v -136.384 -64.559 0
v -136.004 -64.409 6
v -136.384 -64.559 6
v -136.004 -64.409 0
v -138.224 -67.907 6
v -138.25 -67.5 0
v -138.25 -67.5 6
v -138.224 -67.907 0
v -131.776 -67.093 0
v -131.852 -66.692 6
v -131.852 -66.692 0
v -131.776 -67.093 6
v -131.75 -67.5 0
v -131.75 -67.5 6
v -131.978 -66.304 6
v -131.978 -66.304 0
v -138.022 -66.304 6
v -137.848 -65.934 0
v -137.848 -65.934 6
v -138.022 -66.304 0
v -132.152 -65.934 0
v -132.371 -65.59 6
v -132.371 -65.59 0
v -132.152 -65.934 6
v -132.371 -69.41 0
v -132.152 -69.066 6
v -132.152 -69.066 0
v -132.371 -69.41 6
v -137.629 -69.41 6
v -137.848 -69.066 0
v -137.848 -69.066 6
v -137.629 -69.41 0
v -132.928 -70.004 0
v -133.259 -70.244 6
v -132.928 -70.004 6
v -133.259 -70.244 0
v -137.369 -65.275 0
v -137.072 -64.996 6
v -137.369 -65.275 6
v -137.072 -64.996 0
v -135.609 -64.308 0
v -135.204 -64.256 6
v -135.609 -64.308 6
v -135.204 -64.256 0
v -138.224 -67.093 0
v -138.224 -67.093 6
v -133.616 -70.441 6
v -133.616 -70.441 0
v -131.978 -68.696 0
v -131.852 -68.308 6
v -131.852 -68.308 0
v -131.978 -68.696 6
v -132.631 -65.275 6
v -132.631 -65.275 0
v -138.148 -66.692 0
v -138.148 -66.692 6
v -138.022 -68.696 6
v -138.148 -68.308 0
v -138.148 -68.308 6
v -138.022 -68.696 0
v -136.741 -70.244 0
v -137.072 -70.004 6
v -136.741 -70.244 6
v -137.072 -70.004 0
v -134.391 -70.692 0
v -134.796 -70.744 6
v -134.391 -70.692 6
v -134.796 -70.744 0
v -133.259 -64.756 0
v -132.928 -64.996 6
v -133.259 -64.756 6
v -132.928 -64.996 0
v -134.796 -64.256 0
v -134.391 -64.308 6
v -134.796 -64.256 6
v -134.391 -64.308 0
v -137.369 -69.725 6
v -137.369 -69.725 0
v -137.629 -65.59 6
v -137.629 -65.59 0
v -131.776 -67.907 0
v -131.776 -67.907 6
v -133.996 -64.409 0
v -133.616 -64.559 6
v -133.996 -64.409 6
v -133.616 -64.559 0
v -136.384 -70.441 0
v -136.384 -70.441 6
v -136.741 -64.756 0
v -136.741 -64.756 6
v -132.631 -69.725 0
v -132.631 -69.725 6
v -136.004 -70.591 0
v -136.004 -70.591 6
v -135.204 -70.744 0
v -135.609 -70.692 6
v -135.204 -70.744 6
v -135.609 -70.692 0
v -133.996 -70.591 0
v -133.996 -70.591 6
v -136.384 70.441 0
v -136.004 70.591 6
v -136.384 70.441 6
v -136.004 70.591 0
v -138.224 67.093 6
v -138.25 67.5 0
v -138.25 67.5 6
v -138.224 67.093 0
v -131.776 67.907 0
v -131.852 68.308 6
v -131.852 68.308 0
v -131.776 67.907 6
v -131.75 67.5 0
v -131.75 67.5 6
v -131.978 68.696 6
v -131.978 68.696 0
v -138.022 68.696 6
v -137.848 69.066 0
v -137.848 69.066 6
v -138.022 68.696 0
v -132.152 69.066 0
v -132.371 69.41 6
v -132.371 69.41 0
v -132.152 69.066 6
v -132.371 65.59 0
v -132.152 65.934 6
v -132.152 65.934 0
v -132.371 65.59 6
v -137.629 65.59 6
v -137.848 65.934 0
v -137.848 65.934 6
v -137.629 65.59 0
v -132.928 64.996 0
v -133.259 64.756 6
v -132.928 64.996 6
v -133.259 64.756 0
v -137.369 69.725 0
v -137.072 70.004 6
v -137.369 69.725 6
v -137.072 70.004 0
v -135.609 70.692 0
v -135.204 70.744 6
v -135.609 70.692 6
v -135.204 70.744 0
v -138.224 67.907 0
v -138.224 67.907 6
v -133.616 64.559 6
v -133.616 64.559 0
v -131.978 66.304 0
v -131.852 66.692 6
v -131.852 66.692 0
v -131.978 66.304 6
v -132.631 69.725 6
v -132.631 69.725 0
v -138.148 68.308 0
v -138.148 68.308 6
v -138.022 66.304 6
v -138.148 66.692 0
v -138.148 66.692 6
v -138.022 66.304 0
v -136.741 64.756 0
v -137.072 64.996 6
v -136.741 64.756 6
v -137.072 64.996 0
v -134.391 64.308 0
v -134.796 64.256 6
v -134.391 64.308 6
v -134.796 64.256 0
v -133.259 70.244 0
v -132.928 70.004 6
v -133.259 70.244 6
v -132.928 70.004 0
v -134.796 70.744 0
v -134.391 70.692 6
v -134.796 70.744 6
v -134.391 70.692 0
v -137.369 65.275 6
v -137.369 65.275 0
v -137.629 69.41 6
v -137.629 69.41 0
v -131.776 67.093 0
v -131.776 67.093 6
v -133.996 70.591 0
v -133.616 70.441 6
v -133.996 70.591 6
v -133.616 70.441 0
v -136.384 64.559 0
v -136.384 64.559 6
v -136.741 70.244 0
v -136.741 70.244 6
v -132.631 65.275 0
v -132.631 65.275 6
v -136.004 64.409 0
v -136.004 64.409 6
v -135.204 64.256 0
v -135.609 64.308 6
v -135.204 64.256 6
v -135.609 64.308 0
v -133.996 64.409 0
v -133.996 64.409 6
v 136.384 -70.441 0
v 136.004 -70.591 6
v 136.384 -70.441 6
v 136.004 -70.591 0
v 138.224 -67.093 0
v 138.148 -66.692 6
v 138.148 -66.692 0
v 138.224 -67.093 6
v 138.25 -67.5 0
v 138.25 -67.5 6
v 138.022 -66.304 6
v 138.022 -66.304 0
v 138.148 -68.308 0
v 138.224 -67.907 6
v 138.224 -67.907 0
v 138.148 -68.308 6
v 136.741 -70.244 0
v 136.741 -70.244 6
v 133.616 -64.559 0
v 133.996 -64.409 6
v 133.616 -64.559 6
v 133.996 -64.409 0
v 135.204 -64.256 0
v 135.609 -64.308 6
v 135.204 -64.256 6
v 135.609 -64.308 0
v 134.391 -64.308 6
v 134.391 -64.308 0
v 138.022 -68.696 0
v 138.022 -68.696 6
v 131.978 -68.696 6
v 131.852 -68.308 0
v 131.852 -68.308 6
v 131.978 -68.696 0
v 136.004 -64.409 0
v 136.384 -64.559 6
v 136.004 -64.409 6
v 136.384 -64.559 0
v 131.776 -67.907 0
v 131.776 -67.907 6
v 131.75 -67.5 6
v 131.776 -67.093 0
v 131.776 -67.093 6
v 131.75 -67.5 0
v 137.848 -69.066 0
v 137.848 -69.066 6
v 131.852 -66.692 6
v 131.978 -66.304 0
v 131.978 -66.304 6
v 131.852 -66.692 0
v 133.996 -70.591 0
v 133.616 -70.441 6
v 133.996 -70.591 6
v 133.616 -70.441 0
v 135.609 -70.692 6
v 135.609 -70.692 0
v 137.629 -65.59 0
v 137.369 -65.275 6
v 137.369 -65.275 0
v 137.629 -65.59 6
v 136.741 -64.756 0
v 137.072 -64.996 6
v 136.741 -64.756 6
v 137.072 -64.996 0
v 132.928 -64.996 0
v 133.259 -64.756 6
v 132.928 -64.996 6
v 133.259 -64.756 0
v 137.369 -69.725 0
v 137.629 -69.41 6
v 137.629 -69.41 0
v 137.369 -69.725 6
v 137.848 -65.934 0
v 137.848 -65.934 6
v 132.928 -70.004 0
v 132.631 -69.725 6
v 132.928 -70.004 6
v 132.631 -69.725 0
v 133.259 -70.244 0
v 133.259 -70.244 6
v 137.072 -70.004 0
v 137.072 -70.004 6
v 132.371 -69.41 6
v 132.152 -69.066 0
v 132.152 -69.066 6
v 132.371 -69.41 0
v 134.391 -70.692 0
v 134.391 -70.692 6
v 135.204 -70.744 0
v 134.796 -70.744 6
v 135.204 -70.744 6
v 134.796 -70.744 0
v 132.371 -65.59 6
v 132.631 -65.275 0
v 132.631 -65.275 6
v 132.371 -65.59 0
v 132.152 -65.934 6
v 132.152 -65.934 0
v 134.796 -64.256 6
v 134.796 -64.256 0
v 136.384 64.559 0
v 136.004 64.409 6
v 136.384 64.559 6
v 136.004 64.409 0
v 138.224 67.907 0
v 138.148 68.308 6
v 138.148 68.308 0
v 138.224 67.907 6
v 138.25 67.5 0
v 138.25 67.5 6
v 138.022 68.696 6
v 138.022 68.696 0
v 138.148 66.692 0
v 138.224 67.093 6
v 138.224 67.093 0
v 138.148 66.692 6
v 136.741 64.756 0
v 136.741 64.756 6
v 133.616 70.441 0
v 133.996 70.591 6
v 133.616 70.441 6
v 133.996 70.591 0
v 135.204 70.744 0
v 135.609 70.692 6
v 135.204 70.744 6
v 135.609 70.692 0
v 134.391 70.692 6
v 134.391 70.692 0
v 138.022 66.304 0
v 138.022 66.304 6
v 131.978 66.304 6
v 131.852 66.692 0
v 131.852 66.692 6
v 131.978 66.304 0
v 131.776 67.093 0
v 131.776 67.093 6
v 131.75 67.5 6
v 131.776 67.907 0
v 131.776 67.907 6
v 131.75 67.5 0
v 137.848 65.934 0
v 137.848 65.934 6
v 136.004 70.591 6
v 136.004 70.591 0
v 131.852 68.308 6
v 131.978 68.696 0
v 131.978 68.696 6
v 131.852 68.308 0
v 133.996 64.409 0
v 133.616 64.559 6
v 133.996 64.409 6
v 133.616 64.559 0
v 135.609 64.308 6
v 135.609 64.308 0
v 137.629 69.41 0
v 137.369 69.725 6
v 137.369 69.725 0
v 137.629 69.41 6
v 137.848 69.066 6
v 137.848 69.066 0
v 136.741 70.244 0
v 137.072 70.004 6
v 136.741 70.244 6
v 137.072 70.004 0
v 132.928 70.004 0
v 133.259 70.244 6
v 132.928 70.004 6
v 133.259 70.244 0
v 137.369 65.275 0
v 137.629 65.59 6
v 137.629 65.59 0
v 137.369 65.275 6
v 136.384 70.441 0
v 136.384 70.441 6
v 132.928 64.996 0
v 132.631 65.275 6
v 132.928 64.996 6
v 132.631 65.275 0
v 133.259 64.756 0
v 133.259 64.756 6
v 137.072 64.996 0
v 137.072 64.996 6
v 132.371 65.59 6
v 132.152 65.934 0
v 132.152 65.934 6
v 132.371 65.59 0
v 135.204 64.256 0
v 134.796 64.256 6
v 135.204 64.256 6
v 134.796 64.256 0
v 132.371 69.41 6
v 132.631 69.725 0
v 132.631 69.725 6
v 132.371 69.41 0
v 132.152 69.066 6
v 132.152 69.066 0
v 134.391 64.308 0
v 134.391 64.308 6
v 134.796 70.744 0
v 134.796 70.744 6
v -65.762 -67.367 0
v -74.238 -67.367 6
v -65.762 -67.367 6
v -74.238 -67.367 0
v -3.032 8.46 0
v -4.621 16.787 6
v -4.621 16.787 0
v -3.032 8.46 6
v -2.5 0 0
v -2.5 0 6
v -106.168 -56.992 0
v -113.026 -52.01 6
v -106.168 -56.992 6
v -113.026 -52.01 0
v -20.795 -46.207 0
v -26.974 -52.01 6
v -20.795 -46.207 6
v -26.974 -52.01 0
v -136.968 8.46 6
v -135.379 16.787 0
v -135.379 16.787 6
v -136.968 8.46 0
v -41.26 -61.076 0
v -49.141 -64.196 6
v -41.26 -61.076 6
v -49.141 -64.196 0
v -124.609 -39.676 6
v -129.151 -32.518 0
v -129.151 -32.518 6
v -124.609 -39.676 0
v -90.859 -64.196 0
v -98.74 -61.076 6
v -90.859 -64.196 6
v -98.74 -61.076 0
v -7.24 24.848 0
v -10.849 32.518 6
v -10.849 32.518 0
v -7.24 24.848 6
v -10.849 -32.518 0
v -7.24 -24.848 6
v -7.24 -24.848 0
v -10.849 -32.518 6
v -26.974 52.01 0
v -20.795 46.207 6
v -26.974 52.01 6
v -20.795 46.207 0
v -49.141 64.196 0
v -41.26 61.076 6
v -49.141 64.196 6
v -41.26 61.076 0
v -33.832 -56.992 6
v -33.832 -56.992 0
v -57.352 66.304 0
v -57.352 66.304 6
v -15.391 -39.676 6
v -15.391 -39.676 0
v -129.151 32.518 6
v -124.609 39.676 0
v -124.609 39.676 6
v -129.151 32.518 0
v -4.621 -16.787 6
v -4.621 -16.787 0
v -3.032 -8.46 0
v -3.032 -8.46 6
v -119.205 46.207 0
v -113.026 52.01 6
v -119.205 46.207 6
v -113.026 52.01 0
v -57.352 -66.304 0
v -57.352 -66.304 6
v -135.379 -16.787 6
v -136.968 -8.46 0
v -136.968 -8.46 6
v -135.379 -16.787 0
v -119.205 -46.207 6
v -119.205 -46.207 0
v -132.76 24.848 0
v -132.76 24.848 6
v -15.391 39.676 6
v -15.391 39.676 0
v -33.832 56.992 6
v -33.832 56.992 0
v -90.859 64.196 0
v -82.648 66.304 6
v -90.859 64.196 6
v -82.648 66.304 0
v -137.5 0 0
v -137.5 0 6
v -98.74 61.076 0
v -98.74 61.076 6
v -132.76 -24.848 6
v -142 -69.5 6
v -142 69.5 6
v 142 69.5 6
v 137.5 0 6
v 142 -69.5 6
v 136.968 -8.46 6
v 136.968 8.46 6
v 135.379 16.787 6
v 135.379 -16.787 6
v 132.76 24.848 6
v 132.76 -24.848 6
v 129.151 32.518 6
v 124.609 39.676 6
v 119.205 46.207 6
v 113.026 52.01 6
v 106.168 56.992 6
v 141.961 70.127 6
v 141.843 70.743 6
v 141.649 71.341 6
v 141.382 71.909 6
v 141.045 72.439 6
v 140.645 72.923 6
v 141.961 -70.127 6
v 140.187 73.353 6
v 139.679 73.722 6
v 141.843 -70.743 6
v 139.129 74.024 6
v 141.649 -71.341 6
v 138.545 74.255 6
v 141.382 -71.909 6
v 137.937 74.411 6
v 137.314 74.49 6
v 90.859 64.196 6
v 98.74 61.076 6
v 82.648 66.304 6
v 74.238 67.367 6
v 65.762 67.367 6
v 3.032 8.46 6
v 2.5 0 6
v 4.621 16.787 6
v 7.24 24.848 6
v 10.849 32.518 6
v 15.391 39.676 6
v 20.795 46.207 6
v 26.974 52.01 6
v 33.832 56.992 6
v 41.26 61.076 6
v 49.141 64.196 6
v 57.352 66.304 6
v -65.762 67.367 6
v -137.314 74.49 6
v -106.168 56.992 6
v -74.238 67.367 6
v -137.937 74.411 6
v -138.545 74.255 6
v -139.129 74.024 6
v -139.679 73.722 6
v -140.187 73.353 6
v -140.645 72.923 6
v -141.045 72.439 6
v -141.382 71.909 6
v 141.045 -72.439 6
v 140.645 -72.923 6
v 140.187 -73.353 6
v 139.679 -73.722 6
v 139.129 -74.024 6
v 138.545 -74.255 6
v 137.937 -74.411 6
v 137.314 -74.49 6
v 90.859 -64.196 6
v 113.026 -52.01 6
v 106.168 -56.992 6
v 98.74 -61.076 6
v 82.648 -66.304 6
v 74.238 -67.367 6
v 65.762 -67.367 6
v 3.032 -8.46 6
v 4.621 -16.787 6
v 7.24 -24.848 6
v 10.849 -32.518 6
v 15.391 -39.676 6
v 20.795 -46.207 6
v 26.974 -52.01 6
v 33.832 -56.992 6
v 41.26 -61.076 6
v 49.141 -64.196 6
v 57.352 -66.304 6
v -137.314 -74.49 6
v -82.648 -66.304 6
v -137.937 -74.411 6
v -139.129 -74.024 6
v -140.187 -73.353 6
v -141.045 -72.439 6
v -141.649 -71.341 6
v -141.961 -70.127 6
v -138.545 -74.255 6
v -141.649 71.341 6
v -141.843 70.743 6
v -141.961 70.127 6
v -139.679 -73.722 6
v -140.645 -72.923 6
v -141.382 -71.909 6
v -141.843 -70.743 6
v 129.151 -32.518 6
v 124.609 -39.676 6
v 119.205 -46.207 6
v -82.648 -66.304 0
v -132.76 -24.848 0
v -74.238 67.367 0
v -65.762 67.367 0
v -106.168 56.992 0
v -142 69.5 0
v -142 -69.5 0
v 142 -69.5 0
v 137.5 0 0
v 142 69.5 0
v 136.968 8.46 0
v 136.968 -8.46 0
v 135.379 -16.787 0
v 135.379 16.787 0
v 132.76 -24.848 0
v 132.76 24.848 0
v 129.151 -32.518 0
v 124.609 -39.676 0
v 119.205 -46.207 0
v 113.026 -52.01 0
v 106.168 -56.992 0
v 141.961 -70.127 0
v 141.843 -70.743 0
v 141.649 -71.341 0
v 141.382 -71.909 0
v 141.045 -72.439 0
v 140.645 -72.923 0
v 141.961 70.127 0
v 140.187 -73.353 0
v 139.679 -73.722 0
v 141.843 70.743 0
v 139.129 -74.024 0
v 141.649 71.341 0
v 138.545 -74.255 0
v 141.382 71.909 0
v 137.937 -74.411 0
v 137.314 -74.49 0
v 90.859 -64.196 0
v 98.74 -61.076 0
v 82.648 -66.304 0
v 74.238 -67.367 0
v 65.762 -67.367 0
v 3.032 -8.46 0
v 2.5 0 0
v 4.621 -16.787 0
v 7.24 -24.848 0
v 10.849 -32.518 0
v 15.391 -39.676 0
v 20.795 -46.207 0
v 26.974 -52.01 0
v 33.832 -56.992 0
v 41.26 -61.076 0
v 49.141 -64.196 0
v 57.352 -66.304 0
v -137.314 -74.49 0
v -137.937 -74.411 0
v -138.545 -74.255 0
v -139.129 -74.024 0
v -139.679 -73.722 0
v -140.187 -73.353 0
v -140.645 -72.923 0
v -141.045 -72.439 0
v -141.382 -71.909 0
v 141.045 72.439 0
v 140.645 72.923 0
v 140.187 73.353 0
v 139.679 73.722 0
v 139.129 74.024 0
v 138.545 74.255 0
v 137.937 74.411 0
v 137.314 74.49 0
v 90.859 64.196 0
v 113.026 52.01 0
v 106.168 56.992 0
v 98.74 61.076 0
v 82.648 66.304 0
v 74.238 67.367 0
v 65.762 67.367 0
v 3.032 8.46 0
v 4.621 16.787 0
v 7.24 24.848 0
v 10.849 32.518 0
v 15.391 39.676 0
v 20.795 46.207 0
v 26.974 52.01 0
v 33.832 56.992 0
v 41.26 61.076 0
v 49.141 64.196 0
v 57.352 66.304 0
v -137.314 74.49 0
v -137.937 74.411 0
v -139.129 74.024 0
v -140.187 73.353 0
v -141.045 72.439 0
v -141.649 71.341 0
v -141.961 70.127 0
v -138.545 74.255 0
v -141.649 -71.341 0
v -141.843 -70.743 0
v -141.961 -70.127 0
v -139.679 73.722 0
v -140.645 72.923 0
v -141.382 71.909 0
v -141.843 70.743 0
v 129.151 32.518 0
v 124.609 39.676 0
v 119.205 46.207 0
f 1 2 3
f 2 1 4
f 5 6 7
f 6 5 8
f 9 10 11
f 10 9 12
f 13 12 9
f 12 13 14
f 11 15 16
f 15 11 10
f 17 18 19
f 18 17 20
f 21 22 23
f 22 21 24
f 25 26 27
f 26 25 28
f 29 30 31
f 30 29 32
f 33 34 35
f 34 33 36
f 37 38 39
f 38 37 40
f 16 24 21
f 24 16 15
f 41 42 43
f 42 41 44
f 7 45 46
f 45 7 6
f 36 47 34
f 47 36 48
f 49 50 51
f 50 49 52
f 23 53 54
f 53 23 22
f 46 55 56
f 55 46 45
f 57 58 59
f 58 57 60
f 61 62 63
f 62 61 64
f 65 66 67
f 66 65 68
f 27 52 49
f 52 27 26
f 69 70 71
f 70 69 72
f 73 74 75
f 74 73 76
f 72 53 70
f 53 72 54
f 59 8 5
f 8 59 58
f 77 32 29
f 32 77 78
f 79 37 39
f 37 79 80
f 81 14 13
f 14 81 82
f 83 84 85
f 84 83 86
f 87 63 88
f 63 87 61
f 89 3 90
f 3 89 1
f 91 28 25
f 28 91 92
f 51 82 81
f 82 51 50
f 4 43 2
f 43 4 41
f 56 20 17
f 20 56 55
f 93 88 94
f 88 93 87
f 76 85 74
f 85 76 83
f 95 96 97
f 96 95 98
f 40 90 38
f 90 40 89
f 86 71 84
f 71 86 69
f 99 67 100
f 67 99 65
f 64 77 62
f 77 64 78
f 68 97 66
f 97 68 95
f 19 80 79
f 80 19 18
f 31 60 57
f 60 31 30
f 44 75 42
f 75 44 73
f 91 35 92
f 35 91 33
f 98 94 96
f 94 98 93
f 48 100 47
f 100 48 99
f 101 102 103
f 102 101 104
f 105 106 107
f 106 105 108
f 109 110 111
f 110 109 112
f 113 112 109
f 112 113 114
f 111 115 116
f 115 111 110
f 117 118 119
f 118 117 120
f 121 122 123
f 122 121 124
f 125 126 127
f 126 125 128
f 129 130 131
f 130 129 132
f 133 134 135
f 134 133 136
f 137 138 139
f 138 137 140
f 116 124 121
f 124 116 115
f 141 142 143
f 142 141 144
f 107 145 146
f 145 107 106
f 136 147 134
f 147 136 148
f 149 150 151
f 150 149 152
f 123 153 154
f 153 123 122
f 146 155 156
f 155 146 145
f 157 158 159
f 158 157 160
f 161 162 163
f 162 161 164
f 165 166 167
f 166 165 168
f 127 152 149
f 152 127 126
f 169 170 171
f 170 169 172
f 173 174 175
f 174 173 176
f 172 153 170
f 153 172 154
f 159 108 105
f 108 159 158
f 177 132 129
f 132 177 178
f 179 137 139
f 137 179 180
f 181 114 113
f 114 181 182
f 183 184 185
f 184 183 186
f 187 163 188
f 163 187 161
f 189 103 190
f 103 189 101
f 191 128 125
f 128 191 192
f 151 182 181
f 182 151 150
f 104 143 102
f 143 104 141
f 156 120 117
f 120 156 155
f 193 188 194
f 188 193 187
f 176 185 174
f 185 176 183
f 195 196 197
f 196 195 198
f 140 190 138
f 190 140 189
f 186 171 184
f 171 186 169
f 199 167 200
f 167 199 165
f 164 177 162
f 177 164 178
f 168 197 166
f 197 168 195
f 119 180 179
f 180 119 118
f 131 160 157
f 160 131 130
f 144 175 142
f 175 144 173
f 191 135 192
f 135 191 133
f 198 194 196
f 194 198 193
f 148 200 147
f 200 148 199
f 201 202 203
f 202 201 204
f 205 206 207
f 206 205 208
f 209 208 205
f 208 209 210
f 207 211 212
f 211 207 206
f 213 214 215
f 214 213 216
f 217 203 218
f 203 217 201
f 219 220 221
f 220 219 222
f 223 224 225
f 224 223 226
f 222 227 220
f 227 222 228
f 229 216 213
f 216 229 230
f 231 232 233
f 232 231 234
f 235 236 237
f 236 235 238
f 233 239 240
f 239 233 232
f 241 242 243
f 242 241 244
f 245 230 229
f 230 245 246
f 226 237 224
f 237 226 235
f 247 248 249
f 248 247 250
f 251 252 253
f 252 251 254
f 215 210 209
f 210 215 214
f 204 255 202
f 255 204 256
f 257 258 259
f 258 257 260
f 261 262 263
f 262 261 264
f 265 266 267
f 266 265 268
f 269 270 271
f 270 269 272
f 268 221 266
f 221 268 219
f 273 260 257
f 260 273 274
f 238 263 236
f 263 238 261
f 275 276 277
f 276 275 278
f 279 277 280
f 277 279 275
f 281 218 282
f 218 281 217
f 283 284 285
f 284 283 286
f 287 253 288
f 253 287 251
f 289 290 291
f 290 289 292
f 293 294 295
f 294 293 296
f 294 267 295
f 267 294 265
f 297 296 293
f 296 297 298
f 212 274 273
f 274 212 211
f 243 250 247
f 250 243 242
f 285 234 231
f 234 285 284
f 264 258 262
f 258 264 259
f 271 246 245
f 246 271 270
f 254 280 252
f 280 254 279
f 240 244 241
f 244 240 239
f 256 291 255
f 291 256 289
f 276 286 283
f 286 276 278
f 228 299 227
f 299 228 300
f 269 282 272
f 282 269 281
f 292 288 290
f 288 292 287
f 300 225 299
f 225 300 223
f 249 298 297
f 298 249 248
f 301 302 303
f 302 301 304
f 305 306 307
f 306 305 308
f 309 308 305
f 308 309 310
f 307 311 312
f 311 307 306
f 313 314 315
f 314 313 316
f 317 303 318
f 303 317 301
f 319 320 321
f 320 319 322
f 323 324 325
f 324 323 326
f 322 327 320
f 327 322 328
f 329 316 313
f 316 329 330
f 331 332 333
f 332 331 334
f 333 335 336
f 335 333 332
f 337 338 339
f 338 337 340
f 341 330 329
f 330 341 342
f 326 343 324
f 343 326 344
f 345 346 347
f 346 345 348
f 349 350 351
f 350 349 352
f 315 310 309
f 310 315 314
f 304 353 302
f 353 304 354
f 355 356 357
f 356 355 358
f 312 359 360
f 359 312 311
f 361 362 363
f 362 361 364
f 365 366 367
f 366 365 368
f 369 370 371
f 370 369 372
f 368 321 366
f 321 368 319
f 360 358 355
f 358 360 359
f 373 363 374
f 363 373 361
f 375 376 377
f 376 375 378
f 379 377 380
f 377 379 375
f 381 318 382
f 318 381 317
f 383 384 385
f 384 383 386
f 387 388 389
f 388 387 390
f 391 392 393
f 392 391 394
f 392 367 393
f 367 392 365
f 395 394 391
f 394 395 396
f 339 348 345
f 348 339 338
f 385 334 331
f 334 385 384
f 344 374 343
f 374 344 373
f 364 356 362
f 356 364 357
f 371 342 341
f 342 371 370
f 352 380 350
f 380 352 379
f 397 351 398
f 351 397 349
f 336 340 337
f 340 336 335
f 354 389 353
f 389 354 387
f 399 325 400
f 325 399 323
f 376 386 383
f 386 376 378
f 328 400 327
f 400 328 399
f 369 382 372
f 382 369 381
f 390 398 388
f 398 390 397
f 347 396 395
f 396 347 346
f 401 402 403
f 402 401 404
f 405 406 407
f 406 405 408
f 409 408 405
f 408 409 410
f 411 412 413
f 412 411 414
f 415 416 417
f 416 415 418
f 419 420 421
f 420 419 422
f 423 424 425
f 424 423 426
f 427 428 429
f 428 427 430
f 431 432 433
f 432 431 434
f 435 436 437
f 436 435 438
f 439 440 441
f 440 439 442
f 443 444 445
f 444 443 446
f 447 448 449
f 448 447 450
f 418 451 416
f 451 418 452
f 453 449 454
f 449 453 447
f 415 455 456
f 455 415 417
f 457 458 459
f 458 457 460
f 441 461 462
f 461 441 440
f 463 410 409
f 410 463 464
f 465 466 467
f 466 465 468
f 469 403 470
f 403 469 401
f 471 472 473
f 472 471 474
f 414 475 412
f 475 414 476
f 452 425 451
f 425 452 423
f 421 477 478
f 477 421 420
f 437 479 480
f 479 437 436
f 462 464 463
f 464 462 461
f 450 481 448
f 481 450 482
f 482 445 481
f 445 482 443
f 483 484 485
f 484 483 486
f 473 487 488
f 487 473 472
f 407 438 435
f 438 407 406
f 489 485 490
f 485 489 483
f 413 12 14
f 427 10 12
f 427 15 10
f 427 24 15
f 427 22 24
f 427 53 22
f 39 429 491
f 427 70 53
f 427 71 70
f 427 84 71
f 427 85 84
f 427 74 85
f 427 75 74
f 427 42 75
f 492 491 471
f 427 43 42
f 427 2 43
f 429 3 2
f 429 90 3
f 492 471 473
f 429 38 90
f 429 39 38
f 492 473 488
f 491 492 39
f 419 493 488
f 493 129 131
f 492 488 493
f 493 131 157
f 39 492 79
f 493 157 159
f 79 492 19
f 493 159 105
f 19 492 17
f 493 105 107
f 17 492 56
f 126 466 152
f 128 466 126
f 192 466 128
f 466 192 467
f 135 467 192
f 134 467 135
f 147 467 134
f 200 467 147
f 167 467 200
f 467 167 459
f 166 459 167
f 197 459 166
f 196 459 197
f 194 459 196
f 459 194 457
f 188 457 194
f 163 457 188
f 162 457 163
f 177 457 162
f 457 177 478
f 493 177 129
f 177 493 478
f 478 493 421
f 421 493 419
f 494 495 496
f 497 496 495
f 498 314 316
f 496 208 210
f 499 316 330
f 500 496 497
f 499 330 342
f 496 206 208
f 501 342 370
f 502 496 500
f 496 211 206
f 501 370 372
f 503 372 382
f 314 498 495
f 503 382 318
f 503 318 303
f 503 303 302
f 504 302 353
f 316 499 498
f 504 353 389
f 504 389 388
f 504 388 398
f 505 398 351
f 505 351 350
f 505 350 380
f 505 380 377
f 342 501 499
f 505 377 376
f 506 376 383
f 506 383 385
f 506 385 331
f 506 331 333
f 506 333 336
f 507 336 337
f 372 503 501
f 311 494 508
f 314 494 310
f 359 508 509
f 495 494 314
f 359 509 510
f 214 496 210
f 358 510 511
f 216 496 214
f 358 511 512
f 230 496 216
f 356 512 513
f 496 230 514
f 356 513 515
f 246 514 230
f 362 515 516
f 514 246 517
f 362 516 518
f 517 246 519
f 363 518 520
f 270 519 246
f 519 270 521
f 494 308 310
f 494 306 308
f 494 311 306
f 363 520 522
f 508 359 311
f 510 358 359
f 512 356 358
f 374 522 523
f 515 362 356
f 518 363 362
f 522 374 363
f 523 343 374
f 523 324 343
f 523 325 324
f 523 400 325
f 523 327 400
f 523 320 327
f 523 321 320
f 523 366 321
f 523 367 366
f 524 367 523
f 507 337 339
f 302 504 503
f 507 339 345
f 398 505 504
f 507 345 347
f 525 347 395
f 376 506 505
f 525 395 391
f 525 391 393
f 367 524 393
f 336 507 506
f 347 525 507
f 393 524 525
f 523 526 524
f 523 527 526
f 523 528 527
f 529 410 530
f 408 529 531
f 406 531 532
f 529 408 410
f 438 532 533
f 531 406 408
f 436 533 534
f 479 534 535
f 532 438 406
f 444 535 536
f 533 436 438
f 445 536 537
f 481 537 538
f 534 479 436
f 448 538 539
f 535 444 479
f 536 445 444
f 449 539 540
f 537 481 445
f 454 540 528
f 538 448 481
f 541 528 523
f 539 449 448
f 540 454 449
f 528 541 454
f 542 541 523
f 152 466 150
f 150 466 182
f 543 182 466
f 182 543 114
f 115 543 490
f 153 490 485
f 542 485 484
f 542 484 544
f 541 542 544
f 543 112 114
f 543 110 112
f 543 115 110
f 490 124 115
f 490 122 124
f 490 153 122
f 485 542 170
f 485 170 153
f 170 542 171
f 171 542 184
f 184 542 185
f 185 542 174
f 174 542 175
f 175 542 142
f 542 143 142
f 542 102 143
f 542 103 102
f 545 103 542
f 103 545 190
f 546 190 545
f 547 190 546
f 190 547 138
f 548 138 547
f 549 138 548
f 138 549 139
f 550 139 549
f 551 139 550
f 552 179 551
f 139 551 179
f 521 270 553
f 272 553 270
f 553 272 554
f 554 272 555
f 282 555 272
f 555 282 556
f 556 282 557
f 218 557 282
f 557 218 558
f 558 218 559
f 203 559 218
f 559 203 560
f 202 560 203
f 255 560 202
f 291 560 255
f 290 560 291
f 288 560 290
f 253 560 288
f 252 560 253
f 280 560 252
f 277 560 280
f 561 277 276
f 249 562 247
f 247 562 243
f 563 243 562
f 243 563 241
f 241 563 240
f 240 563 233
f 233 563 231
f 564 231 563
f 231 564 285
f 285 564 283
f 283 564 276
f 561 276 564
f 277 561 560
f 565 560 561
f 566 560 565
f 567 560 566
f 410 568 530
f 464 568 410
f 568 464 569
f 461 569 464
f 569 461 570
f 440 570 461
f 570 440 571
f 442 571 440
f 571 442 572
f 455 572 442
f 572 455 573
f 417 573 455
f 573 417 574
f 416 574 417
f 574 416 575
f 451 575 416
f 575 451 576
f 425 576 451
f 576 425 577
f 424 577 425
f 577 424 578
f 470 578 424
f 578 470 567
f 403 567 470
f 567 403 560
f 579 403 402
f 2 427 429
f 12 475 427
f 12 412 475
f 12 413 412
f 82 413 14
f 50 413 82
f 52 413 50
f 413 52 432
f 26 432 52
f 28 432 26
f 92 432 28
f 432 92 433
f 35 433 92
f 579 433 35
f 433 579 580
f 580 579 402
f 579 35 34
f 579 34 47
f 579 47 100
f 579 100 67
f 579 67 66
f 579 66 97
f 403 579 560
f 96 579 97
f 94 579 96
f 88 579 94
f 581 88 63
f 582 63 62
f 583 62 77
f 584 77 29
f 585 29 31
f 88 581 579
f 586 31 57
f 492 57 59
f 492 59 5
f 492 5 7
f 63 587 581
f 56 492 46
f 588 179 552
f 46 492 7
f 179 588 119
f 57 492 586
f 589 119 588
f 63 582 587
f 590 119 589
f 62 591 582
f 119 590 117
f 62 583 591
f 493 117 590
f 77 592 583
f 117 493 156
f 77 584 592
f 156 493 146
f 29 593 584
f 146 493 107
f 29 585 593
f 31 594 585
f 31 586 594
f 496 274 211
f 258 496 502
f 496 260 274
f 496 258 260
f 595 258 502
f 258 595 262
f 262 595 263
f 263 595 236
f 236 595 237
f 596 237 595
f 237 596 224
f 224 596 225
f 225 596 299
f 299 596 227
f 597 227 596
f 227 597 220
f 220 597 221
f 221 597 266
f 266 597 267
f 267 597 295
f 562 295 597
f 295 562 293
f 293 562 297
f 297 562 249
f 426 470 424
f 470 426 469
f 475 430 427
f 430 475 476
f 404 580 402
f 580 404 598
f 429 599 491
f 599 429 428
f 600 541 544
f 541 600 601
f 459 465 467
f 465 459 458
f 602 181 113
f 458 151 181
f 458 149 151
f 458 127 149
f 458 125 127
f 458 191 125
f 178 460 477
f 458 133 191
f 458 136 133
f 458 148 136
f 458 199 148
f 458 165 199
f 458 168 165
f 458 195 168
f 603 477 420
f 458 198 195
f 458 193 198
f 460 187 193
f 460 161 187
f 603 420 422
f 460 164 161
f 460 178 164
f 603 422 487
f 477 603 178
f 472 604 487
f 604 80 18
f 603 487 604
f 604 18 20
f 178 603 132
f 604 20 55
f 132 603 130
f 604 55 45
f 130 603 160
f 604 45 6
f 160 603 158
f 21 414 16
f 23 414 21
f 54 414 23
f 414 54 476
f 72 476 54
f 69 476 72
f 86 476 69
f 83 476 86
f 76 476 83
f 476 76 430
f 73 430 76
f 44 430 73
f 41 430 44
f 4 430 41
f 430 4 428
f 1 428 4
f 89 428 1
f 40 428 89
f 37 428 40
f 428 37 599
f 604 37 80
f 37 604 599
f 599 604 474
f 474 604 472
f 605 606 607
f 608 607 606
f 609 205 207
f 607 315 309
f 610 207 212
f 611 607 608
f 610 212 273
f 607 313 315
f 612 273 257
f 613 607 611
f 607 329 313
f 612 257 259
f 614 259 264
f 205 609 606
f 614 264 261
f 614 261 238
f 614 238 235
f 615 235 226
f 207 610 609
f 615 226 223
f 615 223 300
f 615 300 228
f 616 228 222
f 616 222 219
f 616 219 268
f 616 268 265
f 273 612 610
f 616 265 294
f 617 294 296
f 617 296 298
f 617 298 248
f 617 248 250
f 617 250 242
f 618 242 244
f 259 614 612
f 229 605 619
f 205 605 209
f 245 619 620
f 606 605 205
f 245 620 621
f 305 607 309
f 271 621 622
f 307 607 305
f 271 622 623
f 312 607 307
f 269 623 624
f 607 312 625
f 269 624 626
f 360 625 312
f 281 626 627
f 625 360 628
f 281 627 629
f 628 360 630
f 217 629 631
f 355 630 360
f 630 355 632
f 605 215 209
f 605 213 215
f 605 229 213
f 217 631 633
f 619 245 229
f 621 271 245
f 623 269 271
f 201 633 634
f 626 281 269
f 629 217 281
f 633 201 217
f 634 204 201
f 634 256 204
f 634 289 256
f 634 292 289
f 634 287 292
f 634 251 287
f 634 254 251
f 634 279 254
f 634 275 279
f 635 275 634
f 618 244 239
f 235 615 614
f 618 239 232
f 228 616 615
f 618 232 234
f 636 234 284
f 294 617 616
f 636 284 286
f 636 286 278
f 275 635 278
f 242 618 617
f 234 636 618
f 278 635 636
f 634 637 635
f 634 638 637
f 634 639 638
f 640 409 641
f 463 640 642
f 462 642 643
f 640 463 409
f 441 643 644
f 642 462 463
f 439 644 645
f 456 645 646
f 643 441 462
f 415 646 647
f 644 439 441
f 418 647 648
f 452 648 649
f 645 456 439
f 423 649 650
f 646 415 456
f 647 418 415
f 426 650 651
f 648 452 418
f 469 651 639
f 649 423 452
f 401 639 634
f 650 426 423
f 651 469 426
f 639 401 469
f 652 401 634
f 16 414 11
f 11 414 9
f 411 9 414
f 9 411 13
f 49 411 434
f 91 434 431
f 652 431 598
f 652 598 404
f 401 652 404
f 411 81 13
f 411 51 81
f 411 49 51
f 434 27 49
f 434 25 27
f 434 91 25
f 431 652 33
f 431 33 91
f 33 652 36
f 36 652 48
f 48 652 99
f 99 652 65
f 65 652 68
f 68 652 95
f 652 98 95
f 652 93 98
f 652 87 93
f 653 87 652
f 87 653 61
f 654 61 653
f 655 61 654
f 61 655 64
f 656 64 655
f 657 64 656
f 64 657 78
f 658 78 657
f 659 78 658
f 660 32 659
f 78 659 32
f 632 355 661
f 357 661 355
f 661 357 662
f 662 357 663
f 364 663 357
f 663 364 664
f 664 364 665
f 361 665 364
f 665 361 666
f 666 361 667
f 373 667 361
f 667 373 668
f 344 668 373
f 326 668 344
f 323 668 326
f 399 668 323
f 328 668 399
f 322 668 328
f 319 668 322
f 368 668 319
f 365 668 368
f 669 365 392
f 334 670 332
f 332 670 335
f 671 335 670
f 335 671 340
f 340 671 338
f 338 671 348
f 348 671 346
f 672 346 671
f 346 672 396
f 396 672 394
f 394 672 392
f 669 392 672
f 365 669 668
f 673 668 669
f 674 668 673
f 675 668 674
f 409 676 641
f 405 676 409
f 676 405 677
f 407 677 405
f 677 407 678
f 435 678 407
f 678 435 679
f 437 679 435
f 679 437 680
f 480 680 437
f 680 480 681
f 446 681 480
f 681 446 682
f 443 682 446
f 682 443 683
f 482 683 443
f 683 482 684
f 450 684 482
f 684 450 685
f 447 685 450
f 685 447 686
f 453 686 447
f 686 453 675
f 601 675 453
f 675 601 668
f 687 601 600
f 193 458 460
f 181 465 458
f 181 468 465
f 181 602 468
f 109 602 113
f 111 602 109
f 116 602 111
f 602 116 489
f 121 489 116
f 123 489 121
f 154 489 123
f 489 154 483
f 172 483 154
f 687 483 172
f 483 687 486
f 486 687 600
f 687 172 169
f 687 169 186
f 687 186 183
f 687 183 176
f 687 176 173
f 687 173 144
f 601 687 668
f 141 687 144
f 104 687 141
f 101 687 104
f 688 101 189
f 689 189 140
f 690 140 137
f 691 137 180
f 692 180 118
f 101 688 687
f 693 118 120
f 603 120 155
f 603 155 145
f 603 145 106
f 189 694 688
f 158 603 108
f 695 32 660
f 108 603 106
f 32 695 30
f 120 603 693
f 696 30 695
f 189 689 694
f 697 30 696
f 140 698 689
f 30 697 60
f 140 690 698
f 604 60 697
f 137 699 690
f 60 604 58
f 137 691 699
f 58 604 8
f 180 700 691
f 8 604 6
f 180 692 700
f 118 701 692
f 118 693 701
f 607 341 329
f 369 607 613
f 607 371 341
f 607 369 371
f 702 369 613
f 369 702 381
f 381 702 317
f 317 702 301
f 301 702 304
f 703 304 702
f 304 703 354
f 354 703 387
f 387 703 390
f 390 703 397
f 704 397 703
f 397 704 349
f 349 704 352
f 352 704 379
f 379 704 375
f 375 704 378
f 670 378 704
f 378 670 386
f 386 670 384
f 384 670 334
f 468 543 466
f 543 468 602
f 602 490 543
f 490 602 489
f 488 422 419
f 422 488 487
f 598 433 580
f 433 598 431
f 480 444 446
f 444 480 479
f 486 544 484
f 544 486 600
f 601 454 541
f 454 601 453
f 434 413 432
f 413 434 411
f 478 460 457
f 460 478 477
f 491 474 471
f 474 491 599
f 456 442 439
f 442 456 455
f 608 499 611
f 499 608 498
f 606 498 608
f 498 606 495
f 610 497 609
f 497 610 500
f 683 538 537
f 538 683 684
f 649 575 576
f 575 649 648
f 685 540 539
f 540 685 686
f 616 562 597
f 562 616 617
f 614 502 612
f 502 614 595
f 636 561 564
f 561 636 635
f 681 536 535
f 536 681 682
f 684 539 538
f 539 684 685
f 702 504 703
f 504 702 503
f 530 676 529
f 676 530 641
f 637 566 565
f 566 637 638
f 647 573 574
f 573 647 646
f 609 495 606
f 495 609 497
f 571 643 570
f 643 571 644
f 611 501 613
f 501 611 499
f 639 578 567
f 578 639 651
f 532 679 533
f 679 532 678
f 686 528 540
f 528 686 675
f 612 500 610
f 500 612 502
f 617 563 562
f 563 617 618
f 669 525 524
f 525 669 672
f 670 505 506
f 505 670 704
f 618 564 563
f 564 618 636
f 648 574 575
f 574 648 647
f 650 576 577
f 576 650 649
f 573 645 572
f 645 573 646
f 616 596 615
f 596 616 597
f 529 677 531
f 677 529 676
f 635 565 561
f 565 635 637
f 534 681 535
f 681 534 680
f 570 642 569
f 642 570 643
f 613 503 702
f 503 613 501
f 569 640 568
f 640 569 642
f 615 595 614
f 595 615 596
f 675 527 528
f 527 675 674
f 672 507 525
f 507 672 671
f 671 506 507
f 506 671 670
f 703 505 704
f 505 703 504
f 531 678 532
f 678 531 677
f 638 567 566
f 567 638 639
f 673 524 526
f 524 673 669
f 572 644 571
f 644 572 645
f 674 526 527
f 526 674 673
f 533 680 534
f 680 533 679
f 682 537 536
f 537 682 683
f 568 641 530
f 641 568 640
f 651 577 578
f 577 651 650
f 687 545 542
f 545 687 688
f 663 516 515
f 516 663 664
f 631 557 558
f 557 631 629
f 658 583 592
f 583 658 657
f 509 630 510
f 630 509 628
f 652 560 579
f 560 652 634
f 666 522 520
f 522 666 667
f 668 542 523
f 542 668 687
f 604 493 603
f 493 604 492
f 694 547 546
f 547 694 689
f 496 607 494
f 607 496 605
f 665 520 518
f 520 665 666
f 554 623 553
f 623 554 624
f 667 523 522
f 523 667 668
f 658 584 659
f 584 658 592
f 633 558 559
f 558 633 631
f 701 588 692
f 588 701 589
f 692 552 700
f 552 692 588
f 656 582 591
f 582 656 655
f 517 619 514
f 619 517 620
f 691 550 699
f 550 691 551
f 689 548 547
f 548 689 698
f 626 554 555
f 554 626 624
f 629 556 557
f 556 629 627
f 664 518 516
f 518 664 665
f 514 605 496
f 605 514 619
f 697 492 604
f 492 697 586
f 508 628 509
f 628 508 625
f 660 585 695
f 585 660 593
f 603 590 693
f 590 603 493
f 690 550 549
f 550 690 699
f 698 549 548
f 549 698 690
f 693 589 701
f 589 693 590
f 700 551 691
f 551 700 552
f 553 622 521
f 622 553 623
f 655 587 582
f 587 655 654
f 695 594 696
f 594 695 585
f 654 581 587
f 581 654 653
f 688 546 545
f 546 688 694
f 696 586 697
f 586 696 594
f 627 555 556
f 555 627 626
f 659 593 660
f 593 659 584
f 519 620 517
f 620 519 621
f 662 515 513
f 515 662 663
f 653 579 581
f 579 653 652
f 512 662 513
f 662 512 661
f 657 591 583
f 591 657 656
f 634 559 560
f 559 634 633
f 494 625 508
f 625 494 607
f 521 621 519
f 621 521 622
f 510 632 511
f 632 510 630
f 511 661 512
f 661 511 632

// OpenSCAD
$fn = 50;


difference() {
	union() {
		hull() {
			translate(v = [-137.0000000000, 69.5000000000, 0]) {
				cylinder(h = 6, r = 5);
			}
			translate(v = [137.0000000000, 69.5000000000, 0]) {
				cylinder(h = 6, r = 5);
			}
			translate(v = [-137.0000000000, -69.5000000000, 0]) {
				cylinder(h = 6, r = 5);
			}
			translate(v = [137.0000000000, -69.5000000000, 0]) {
				cylinder(h = 6, r = 5);
			}
		}
	}
	union() {
		#translate(v = [-135.0000000000, -67.5000000000, -100.0000000000]) {
			cylinder(h = 200, r = 3.2500000000);
		}
		#translate(v = [-135.0000000000, 67.5000000000, -100.0000000000]) {
			cylinder(h = 200, r = 3.2500000000);
		}
		#translate(v = [135.0000000000, -67.5000000000, -100.0000000000]) {
			cylinder(h = 200, r = 3.2500000000);
		}
		#translate(v = [135.0000000000, 67.5000000000, -100.0000000000]) {
			cylinder(h = 200, r = 3.2500000000);
		}
		#translate(v = [-70.0000000000, 0, 0]) {
			cylinder(h = 6, r = 67.5000000000);
		}
		#translate(v = [70.0000000000, 0, 0]) {
			cylinder(h = 6, r = 67.5000000000);
		}
	}
}
